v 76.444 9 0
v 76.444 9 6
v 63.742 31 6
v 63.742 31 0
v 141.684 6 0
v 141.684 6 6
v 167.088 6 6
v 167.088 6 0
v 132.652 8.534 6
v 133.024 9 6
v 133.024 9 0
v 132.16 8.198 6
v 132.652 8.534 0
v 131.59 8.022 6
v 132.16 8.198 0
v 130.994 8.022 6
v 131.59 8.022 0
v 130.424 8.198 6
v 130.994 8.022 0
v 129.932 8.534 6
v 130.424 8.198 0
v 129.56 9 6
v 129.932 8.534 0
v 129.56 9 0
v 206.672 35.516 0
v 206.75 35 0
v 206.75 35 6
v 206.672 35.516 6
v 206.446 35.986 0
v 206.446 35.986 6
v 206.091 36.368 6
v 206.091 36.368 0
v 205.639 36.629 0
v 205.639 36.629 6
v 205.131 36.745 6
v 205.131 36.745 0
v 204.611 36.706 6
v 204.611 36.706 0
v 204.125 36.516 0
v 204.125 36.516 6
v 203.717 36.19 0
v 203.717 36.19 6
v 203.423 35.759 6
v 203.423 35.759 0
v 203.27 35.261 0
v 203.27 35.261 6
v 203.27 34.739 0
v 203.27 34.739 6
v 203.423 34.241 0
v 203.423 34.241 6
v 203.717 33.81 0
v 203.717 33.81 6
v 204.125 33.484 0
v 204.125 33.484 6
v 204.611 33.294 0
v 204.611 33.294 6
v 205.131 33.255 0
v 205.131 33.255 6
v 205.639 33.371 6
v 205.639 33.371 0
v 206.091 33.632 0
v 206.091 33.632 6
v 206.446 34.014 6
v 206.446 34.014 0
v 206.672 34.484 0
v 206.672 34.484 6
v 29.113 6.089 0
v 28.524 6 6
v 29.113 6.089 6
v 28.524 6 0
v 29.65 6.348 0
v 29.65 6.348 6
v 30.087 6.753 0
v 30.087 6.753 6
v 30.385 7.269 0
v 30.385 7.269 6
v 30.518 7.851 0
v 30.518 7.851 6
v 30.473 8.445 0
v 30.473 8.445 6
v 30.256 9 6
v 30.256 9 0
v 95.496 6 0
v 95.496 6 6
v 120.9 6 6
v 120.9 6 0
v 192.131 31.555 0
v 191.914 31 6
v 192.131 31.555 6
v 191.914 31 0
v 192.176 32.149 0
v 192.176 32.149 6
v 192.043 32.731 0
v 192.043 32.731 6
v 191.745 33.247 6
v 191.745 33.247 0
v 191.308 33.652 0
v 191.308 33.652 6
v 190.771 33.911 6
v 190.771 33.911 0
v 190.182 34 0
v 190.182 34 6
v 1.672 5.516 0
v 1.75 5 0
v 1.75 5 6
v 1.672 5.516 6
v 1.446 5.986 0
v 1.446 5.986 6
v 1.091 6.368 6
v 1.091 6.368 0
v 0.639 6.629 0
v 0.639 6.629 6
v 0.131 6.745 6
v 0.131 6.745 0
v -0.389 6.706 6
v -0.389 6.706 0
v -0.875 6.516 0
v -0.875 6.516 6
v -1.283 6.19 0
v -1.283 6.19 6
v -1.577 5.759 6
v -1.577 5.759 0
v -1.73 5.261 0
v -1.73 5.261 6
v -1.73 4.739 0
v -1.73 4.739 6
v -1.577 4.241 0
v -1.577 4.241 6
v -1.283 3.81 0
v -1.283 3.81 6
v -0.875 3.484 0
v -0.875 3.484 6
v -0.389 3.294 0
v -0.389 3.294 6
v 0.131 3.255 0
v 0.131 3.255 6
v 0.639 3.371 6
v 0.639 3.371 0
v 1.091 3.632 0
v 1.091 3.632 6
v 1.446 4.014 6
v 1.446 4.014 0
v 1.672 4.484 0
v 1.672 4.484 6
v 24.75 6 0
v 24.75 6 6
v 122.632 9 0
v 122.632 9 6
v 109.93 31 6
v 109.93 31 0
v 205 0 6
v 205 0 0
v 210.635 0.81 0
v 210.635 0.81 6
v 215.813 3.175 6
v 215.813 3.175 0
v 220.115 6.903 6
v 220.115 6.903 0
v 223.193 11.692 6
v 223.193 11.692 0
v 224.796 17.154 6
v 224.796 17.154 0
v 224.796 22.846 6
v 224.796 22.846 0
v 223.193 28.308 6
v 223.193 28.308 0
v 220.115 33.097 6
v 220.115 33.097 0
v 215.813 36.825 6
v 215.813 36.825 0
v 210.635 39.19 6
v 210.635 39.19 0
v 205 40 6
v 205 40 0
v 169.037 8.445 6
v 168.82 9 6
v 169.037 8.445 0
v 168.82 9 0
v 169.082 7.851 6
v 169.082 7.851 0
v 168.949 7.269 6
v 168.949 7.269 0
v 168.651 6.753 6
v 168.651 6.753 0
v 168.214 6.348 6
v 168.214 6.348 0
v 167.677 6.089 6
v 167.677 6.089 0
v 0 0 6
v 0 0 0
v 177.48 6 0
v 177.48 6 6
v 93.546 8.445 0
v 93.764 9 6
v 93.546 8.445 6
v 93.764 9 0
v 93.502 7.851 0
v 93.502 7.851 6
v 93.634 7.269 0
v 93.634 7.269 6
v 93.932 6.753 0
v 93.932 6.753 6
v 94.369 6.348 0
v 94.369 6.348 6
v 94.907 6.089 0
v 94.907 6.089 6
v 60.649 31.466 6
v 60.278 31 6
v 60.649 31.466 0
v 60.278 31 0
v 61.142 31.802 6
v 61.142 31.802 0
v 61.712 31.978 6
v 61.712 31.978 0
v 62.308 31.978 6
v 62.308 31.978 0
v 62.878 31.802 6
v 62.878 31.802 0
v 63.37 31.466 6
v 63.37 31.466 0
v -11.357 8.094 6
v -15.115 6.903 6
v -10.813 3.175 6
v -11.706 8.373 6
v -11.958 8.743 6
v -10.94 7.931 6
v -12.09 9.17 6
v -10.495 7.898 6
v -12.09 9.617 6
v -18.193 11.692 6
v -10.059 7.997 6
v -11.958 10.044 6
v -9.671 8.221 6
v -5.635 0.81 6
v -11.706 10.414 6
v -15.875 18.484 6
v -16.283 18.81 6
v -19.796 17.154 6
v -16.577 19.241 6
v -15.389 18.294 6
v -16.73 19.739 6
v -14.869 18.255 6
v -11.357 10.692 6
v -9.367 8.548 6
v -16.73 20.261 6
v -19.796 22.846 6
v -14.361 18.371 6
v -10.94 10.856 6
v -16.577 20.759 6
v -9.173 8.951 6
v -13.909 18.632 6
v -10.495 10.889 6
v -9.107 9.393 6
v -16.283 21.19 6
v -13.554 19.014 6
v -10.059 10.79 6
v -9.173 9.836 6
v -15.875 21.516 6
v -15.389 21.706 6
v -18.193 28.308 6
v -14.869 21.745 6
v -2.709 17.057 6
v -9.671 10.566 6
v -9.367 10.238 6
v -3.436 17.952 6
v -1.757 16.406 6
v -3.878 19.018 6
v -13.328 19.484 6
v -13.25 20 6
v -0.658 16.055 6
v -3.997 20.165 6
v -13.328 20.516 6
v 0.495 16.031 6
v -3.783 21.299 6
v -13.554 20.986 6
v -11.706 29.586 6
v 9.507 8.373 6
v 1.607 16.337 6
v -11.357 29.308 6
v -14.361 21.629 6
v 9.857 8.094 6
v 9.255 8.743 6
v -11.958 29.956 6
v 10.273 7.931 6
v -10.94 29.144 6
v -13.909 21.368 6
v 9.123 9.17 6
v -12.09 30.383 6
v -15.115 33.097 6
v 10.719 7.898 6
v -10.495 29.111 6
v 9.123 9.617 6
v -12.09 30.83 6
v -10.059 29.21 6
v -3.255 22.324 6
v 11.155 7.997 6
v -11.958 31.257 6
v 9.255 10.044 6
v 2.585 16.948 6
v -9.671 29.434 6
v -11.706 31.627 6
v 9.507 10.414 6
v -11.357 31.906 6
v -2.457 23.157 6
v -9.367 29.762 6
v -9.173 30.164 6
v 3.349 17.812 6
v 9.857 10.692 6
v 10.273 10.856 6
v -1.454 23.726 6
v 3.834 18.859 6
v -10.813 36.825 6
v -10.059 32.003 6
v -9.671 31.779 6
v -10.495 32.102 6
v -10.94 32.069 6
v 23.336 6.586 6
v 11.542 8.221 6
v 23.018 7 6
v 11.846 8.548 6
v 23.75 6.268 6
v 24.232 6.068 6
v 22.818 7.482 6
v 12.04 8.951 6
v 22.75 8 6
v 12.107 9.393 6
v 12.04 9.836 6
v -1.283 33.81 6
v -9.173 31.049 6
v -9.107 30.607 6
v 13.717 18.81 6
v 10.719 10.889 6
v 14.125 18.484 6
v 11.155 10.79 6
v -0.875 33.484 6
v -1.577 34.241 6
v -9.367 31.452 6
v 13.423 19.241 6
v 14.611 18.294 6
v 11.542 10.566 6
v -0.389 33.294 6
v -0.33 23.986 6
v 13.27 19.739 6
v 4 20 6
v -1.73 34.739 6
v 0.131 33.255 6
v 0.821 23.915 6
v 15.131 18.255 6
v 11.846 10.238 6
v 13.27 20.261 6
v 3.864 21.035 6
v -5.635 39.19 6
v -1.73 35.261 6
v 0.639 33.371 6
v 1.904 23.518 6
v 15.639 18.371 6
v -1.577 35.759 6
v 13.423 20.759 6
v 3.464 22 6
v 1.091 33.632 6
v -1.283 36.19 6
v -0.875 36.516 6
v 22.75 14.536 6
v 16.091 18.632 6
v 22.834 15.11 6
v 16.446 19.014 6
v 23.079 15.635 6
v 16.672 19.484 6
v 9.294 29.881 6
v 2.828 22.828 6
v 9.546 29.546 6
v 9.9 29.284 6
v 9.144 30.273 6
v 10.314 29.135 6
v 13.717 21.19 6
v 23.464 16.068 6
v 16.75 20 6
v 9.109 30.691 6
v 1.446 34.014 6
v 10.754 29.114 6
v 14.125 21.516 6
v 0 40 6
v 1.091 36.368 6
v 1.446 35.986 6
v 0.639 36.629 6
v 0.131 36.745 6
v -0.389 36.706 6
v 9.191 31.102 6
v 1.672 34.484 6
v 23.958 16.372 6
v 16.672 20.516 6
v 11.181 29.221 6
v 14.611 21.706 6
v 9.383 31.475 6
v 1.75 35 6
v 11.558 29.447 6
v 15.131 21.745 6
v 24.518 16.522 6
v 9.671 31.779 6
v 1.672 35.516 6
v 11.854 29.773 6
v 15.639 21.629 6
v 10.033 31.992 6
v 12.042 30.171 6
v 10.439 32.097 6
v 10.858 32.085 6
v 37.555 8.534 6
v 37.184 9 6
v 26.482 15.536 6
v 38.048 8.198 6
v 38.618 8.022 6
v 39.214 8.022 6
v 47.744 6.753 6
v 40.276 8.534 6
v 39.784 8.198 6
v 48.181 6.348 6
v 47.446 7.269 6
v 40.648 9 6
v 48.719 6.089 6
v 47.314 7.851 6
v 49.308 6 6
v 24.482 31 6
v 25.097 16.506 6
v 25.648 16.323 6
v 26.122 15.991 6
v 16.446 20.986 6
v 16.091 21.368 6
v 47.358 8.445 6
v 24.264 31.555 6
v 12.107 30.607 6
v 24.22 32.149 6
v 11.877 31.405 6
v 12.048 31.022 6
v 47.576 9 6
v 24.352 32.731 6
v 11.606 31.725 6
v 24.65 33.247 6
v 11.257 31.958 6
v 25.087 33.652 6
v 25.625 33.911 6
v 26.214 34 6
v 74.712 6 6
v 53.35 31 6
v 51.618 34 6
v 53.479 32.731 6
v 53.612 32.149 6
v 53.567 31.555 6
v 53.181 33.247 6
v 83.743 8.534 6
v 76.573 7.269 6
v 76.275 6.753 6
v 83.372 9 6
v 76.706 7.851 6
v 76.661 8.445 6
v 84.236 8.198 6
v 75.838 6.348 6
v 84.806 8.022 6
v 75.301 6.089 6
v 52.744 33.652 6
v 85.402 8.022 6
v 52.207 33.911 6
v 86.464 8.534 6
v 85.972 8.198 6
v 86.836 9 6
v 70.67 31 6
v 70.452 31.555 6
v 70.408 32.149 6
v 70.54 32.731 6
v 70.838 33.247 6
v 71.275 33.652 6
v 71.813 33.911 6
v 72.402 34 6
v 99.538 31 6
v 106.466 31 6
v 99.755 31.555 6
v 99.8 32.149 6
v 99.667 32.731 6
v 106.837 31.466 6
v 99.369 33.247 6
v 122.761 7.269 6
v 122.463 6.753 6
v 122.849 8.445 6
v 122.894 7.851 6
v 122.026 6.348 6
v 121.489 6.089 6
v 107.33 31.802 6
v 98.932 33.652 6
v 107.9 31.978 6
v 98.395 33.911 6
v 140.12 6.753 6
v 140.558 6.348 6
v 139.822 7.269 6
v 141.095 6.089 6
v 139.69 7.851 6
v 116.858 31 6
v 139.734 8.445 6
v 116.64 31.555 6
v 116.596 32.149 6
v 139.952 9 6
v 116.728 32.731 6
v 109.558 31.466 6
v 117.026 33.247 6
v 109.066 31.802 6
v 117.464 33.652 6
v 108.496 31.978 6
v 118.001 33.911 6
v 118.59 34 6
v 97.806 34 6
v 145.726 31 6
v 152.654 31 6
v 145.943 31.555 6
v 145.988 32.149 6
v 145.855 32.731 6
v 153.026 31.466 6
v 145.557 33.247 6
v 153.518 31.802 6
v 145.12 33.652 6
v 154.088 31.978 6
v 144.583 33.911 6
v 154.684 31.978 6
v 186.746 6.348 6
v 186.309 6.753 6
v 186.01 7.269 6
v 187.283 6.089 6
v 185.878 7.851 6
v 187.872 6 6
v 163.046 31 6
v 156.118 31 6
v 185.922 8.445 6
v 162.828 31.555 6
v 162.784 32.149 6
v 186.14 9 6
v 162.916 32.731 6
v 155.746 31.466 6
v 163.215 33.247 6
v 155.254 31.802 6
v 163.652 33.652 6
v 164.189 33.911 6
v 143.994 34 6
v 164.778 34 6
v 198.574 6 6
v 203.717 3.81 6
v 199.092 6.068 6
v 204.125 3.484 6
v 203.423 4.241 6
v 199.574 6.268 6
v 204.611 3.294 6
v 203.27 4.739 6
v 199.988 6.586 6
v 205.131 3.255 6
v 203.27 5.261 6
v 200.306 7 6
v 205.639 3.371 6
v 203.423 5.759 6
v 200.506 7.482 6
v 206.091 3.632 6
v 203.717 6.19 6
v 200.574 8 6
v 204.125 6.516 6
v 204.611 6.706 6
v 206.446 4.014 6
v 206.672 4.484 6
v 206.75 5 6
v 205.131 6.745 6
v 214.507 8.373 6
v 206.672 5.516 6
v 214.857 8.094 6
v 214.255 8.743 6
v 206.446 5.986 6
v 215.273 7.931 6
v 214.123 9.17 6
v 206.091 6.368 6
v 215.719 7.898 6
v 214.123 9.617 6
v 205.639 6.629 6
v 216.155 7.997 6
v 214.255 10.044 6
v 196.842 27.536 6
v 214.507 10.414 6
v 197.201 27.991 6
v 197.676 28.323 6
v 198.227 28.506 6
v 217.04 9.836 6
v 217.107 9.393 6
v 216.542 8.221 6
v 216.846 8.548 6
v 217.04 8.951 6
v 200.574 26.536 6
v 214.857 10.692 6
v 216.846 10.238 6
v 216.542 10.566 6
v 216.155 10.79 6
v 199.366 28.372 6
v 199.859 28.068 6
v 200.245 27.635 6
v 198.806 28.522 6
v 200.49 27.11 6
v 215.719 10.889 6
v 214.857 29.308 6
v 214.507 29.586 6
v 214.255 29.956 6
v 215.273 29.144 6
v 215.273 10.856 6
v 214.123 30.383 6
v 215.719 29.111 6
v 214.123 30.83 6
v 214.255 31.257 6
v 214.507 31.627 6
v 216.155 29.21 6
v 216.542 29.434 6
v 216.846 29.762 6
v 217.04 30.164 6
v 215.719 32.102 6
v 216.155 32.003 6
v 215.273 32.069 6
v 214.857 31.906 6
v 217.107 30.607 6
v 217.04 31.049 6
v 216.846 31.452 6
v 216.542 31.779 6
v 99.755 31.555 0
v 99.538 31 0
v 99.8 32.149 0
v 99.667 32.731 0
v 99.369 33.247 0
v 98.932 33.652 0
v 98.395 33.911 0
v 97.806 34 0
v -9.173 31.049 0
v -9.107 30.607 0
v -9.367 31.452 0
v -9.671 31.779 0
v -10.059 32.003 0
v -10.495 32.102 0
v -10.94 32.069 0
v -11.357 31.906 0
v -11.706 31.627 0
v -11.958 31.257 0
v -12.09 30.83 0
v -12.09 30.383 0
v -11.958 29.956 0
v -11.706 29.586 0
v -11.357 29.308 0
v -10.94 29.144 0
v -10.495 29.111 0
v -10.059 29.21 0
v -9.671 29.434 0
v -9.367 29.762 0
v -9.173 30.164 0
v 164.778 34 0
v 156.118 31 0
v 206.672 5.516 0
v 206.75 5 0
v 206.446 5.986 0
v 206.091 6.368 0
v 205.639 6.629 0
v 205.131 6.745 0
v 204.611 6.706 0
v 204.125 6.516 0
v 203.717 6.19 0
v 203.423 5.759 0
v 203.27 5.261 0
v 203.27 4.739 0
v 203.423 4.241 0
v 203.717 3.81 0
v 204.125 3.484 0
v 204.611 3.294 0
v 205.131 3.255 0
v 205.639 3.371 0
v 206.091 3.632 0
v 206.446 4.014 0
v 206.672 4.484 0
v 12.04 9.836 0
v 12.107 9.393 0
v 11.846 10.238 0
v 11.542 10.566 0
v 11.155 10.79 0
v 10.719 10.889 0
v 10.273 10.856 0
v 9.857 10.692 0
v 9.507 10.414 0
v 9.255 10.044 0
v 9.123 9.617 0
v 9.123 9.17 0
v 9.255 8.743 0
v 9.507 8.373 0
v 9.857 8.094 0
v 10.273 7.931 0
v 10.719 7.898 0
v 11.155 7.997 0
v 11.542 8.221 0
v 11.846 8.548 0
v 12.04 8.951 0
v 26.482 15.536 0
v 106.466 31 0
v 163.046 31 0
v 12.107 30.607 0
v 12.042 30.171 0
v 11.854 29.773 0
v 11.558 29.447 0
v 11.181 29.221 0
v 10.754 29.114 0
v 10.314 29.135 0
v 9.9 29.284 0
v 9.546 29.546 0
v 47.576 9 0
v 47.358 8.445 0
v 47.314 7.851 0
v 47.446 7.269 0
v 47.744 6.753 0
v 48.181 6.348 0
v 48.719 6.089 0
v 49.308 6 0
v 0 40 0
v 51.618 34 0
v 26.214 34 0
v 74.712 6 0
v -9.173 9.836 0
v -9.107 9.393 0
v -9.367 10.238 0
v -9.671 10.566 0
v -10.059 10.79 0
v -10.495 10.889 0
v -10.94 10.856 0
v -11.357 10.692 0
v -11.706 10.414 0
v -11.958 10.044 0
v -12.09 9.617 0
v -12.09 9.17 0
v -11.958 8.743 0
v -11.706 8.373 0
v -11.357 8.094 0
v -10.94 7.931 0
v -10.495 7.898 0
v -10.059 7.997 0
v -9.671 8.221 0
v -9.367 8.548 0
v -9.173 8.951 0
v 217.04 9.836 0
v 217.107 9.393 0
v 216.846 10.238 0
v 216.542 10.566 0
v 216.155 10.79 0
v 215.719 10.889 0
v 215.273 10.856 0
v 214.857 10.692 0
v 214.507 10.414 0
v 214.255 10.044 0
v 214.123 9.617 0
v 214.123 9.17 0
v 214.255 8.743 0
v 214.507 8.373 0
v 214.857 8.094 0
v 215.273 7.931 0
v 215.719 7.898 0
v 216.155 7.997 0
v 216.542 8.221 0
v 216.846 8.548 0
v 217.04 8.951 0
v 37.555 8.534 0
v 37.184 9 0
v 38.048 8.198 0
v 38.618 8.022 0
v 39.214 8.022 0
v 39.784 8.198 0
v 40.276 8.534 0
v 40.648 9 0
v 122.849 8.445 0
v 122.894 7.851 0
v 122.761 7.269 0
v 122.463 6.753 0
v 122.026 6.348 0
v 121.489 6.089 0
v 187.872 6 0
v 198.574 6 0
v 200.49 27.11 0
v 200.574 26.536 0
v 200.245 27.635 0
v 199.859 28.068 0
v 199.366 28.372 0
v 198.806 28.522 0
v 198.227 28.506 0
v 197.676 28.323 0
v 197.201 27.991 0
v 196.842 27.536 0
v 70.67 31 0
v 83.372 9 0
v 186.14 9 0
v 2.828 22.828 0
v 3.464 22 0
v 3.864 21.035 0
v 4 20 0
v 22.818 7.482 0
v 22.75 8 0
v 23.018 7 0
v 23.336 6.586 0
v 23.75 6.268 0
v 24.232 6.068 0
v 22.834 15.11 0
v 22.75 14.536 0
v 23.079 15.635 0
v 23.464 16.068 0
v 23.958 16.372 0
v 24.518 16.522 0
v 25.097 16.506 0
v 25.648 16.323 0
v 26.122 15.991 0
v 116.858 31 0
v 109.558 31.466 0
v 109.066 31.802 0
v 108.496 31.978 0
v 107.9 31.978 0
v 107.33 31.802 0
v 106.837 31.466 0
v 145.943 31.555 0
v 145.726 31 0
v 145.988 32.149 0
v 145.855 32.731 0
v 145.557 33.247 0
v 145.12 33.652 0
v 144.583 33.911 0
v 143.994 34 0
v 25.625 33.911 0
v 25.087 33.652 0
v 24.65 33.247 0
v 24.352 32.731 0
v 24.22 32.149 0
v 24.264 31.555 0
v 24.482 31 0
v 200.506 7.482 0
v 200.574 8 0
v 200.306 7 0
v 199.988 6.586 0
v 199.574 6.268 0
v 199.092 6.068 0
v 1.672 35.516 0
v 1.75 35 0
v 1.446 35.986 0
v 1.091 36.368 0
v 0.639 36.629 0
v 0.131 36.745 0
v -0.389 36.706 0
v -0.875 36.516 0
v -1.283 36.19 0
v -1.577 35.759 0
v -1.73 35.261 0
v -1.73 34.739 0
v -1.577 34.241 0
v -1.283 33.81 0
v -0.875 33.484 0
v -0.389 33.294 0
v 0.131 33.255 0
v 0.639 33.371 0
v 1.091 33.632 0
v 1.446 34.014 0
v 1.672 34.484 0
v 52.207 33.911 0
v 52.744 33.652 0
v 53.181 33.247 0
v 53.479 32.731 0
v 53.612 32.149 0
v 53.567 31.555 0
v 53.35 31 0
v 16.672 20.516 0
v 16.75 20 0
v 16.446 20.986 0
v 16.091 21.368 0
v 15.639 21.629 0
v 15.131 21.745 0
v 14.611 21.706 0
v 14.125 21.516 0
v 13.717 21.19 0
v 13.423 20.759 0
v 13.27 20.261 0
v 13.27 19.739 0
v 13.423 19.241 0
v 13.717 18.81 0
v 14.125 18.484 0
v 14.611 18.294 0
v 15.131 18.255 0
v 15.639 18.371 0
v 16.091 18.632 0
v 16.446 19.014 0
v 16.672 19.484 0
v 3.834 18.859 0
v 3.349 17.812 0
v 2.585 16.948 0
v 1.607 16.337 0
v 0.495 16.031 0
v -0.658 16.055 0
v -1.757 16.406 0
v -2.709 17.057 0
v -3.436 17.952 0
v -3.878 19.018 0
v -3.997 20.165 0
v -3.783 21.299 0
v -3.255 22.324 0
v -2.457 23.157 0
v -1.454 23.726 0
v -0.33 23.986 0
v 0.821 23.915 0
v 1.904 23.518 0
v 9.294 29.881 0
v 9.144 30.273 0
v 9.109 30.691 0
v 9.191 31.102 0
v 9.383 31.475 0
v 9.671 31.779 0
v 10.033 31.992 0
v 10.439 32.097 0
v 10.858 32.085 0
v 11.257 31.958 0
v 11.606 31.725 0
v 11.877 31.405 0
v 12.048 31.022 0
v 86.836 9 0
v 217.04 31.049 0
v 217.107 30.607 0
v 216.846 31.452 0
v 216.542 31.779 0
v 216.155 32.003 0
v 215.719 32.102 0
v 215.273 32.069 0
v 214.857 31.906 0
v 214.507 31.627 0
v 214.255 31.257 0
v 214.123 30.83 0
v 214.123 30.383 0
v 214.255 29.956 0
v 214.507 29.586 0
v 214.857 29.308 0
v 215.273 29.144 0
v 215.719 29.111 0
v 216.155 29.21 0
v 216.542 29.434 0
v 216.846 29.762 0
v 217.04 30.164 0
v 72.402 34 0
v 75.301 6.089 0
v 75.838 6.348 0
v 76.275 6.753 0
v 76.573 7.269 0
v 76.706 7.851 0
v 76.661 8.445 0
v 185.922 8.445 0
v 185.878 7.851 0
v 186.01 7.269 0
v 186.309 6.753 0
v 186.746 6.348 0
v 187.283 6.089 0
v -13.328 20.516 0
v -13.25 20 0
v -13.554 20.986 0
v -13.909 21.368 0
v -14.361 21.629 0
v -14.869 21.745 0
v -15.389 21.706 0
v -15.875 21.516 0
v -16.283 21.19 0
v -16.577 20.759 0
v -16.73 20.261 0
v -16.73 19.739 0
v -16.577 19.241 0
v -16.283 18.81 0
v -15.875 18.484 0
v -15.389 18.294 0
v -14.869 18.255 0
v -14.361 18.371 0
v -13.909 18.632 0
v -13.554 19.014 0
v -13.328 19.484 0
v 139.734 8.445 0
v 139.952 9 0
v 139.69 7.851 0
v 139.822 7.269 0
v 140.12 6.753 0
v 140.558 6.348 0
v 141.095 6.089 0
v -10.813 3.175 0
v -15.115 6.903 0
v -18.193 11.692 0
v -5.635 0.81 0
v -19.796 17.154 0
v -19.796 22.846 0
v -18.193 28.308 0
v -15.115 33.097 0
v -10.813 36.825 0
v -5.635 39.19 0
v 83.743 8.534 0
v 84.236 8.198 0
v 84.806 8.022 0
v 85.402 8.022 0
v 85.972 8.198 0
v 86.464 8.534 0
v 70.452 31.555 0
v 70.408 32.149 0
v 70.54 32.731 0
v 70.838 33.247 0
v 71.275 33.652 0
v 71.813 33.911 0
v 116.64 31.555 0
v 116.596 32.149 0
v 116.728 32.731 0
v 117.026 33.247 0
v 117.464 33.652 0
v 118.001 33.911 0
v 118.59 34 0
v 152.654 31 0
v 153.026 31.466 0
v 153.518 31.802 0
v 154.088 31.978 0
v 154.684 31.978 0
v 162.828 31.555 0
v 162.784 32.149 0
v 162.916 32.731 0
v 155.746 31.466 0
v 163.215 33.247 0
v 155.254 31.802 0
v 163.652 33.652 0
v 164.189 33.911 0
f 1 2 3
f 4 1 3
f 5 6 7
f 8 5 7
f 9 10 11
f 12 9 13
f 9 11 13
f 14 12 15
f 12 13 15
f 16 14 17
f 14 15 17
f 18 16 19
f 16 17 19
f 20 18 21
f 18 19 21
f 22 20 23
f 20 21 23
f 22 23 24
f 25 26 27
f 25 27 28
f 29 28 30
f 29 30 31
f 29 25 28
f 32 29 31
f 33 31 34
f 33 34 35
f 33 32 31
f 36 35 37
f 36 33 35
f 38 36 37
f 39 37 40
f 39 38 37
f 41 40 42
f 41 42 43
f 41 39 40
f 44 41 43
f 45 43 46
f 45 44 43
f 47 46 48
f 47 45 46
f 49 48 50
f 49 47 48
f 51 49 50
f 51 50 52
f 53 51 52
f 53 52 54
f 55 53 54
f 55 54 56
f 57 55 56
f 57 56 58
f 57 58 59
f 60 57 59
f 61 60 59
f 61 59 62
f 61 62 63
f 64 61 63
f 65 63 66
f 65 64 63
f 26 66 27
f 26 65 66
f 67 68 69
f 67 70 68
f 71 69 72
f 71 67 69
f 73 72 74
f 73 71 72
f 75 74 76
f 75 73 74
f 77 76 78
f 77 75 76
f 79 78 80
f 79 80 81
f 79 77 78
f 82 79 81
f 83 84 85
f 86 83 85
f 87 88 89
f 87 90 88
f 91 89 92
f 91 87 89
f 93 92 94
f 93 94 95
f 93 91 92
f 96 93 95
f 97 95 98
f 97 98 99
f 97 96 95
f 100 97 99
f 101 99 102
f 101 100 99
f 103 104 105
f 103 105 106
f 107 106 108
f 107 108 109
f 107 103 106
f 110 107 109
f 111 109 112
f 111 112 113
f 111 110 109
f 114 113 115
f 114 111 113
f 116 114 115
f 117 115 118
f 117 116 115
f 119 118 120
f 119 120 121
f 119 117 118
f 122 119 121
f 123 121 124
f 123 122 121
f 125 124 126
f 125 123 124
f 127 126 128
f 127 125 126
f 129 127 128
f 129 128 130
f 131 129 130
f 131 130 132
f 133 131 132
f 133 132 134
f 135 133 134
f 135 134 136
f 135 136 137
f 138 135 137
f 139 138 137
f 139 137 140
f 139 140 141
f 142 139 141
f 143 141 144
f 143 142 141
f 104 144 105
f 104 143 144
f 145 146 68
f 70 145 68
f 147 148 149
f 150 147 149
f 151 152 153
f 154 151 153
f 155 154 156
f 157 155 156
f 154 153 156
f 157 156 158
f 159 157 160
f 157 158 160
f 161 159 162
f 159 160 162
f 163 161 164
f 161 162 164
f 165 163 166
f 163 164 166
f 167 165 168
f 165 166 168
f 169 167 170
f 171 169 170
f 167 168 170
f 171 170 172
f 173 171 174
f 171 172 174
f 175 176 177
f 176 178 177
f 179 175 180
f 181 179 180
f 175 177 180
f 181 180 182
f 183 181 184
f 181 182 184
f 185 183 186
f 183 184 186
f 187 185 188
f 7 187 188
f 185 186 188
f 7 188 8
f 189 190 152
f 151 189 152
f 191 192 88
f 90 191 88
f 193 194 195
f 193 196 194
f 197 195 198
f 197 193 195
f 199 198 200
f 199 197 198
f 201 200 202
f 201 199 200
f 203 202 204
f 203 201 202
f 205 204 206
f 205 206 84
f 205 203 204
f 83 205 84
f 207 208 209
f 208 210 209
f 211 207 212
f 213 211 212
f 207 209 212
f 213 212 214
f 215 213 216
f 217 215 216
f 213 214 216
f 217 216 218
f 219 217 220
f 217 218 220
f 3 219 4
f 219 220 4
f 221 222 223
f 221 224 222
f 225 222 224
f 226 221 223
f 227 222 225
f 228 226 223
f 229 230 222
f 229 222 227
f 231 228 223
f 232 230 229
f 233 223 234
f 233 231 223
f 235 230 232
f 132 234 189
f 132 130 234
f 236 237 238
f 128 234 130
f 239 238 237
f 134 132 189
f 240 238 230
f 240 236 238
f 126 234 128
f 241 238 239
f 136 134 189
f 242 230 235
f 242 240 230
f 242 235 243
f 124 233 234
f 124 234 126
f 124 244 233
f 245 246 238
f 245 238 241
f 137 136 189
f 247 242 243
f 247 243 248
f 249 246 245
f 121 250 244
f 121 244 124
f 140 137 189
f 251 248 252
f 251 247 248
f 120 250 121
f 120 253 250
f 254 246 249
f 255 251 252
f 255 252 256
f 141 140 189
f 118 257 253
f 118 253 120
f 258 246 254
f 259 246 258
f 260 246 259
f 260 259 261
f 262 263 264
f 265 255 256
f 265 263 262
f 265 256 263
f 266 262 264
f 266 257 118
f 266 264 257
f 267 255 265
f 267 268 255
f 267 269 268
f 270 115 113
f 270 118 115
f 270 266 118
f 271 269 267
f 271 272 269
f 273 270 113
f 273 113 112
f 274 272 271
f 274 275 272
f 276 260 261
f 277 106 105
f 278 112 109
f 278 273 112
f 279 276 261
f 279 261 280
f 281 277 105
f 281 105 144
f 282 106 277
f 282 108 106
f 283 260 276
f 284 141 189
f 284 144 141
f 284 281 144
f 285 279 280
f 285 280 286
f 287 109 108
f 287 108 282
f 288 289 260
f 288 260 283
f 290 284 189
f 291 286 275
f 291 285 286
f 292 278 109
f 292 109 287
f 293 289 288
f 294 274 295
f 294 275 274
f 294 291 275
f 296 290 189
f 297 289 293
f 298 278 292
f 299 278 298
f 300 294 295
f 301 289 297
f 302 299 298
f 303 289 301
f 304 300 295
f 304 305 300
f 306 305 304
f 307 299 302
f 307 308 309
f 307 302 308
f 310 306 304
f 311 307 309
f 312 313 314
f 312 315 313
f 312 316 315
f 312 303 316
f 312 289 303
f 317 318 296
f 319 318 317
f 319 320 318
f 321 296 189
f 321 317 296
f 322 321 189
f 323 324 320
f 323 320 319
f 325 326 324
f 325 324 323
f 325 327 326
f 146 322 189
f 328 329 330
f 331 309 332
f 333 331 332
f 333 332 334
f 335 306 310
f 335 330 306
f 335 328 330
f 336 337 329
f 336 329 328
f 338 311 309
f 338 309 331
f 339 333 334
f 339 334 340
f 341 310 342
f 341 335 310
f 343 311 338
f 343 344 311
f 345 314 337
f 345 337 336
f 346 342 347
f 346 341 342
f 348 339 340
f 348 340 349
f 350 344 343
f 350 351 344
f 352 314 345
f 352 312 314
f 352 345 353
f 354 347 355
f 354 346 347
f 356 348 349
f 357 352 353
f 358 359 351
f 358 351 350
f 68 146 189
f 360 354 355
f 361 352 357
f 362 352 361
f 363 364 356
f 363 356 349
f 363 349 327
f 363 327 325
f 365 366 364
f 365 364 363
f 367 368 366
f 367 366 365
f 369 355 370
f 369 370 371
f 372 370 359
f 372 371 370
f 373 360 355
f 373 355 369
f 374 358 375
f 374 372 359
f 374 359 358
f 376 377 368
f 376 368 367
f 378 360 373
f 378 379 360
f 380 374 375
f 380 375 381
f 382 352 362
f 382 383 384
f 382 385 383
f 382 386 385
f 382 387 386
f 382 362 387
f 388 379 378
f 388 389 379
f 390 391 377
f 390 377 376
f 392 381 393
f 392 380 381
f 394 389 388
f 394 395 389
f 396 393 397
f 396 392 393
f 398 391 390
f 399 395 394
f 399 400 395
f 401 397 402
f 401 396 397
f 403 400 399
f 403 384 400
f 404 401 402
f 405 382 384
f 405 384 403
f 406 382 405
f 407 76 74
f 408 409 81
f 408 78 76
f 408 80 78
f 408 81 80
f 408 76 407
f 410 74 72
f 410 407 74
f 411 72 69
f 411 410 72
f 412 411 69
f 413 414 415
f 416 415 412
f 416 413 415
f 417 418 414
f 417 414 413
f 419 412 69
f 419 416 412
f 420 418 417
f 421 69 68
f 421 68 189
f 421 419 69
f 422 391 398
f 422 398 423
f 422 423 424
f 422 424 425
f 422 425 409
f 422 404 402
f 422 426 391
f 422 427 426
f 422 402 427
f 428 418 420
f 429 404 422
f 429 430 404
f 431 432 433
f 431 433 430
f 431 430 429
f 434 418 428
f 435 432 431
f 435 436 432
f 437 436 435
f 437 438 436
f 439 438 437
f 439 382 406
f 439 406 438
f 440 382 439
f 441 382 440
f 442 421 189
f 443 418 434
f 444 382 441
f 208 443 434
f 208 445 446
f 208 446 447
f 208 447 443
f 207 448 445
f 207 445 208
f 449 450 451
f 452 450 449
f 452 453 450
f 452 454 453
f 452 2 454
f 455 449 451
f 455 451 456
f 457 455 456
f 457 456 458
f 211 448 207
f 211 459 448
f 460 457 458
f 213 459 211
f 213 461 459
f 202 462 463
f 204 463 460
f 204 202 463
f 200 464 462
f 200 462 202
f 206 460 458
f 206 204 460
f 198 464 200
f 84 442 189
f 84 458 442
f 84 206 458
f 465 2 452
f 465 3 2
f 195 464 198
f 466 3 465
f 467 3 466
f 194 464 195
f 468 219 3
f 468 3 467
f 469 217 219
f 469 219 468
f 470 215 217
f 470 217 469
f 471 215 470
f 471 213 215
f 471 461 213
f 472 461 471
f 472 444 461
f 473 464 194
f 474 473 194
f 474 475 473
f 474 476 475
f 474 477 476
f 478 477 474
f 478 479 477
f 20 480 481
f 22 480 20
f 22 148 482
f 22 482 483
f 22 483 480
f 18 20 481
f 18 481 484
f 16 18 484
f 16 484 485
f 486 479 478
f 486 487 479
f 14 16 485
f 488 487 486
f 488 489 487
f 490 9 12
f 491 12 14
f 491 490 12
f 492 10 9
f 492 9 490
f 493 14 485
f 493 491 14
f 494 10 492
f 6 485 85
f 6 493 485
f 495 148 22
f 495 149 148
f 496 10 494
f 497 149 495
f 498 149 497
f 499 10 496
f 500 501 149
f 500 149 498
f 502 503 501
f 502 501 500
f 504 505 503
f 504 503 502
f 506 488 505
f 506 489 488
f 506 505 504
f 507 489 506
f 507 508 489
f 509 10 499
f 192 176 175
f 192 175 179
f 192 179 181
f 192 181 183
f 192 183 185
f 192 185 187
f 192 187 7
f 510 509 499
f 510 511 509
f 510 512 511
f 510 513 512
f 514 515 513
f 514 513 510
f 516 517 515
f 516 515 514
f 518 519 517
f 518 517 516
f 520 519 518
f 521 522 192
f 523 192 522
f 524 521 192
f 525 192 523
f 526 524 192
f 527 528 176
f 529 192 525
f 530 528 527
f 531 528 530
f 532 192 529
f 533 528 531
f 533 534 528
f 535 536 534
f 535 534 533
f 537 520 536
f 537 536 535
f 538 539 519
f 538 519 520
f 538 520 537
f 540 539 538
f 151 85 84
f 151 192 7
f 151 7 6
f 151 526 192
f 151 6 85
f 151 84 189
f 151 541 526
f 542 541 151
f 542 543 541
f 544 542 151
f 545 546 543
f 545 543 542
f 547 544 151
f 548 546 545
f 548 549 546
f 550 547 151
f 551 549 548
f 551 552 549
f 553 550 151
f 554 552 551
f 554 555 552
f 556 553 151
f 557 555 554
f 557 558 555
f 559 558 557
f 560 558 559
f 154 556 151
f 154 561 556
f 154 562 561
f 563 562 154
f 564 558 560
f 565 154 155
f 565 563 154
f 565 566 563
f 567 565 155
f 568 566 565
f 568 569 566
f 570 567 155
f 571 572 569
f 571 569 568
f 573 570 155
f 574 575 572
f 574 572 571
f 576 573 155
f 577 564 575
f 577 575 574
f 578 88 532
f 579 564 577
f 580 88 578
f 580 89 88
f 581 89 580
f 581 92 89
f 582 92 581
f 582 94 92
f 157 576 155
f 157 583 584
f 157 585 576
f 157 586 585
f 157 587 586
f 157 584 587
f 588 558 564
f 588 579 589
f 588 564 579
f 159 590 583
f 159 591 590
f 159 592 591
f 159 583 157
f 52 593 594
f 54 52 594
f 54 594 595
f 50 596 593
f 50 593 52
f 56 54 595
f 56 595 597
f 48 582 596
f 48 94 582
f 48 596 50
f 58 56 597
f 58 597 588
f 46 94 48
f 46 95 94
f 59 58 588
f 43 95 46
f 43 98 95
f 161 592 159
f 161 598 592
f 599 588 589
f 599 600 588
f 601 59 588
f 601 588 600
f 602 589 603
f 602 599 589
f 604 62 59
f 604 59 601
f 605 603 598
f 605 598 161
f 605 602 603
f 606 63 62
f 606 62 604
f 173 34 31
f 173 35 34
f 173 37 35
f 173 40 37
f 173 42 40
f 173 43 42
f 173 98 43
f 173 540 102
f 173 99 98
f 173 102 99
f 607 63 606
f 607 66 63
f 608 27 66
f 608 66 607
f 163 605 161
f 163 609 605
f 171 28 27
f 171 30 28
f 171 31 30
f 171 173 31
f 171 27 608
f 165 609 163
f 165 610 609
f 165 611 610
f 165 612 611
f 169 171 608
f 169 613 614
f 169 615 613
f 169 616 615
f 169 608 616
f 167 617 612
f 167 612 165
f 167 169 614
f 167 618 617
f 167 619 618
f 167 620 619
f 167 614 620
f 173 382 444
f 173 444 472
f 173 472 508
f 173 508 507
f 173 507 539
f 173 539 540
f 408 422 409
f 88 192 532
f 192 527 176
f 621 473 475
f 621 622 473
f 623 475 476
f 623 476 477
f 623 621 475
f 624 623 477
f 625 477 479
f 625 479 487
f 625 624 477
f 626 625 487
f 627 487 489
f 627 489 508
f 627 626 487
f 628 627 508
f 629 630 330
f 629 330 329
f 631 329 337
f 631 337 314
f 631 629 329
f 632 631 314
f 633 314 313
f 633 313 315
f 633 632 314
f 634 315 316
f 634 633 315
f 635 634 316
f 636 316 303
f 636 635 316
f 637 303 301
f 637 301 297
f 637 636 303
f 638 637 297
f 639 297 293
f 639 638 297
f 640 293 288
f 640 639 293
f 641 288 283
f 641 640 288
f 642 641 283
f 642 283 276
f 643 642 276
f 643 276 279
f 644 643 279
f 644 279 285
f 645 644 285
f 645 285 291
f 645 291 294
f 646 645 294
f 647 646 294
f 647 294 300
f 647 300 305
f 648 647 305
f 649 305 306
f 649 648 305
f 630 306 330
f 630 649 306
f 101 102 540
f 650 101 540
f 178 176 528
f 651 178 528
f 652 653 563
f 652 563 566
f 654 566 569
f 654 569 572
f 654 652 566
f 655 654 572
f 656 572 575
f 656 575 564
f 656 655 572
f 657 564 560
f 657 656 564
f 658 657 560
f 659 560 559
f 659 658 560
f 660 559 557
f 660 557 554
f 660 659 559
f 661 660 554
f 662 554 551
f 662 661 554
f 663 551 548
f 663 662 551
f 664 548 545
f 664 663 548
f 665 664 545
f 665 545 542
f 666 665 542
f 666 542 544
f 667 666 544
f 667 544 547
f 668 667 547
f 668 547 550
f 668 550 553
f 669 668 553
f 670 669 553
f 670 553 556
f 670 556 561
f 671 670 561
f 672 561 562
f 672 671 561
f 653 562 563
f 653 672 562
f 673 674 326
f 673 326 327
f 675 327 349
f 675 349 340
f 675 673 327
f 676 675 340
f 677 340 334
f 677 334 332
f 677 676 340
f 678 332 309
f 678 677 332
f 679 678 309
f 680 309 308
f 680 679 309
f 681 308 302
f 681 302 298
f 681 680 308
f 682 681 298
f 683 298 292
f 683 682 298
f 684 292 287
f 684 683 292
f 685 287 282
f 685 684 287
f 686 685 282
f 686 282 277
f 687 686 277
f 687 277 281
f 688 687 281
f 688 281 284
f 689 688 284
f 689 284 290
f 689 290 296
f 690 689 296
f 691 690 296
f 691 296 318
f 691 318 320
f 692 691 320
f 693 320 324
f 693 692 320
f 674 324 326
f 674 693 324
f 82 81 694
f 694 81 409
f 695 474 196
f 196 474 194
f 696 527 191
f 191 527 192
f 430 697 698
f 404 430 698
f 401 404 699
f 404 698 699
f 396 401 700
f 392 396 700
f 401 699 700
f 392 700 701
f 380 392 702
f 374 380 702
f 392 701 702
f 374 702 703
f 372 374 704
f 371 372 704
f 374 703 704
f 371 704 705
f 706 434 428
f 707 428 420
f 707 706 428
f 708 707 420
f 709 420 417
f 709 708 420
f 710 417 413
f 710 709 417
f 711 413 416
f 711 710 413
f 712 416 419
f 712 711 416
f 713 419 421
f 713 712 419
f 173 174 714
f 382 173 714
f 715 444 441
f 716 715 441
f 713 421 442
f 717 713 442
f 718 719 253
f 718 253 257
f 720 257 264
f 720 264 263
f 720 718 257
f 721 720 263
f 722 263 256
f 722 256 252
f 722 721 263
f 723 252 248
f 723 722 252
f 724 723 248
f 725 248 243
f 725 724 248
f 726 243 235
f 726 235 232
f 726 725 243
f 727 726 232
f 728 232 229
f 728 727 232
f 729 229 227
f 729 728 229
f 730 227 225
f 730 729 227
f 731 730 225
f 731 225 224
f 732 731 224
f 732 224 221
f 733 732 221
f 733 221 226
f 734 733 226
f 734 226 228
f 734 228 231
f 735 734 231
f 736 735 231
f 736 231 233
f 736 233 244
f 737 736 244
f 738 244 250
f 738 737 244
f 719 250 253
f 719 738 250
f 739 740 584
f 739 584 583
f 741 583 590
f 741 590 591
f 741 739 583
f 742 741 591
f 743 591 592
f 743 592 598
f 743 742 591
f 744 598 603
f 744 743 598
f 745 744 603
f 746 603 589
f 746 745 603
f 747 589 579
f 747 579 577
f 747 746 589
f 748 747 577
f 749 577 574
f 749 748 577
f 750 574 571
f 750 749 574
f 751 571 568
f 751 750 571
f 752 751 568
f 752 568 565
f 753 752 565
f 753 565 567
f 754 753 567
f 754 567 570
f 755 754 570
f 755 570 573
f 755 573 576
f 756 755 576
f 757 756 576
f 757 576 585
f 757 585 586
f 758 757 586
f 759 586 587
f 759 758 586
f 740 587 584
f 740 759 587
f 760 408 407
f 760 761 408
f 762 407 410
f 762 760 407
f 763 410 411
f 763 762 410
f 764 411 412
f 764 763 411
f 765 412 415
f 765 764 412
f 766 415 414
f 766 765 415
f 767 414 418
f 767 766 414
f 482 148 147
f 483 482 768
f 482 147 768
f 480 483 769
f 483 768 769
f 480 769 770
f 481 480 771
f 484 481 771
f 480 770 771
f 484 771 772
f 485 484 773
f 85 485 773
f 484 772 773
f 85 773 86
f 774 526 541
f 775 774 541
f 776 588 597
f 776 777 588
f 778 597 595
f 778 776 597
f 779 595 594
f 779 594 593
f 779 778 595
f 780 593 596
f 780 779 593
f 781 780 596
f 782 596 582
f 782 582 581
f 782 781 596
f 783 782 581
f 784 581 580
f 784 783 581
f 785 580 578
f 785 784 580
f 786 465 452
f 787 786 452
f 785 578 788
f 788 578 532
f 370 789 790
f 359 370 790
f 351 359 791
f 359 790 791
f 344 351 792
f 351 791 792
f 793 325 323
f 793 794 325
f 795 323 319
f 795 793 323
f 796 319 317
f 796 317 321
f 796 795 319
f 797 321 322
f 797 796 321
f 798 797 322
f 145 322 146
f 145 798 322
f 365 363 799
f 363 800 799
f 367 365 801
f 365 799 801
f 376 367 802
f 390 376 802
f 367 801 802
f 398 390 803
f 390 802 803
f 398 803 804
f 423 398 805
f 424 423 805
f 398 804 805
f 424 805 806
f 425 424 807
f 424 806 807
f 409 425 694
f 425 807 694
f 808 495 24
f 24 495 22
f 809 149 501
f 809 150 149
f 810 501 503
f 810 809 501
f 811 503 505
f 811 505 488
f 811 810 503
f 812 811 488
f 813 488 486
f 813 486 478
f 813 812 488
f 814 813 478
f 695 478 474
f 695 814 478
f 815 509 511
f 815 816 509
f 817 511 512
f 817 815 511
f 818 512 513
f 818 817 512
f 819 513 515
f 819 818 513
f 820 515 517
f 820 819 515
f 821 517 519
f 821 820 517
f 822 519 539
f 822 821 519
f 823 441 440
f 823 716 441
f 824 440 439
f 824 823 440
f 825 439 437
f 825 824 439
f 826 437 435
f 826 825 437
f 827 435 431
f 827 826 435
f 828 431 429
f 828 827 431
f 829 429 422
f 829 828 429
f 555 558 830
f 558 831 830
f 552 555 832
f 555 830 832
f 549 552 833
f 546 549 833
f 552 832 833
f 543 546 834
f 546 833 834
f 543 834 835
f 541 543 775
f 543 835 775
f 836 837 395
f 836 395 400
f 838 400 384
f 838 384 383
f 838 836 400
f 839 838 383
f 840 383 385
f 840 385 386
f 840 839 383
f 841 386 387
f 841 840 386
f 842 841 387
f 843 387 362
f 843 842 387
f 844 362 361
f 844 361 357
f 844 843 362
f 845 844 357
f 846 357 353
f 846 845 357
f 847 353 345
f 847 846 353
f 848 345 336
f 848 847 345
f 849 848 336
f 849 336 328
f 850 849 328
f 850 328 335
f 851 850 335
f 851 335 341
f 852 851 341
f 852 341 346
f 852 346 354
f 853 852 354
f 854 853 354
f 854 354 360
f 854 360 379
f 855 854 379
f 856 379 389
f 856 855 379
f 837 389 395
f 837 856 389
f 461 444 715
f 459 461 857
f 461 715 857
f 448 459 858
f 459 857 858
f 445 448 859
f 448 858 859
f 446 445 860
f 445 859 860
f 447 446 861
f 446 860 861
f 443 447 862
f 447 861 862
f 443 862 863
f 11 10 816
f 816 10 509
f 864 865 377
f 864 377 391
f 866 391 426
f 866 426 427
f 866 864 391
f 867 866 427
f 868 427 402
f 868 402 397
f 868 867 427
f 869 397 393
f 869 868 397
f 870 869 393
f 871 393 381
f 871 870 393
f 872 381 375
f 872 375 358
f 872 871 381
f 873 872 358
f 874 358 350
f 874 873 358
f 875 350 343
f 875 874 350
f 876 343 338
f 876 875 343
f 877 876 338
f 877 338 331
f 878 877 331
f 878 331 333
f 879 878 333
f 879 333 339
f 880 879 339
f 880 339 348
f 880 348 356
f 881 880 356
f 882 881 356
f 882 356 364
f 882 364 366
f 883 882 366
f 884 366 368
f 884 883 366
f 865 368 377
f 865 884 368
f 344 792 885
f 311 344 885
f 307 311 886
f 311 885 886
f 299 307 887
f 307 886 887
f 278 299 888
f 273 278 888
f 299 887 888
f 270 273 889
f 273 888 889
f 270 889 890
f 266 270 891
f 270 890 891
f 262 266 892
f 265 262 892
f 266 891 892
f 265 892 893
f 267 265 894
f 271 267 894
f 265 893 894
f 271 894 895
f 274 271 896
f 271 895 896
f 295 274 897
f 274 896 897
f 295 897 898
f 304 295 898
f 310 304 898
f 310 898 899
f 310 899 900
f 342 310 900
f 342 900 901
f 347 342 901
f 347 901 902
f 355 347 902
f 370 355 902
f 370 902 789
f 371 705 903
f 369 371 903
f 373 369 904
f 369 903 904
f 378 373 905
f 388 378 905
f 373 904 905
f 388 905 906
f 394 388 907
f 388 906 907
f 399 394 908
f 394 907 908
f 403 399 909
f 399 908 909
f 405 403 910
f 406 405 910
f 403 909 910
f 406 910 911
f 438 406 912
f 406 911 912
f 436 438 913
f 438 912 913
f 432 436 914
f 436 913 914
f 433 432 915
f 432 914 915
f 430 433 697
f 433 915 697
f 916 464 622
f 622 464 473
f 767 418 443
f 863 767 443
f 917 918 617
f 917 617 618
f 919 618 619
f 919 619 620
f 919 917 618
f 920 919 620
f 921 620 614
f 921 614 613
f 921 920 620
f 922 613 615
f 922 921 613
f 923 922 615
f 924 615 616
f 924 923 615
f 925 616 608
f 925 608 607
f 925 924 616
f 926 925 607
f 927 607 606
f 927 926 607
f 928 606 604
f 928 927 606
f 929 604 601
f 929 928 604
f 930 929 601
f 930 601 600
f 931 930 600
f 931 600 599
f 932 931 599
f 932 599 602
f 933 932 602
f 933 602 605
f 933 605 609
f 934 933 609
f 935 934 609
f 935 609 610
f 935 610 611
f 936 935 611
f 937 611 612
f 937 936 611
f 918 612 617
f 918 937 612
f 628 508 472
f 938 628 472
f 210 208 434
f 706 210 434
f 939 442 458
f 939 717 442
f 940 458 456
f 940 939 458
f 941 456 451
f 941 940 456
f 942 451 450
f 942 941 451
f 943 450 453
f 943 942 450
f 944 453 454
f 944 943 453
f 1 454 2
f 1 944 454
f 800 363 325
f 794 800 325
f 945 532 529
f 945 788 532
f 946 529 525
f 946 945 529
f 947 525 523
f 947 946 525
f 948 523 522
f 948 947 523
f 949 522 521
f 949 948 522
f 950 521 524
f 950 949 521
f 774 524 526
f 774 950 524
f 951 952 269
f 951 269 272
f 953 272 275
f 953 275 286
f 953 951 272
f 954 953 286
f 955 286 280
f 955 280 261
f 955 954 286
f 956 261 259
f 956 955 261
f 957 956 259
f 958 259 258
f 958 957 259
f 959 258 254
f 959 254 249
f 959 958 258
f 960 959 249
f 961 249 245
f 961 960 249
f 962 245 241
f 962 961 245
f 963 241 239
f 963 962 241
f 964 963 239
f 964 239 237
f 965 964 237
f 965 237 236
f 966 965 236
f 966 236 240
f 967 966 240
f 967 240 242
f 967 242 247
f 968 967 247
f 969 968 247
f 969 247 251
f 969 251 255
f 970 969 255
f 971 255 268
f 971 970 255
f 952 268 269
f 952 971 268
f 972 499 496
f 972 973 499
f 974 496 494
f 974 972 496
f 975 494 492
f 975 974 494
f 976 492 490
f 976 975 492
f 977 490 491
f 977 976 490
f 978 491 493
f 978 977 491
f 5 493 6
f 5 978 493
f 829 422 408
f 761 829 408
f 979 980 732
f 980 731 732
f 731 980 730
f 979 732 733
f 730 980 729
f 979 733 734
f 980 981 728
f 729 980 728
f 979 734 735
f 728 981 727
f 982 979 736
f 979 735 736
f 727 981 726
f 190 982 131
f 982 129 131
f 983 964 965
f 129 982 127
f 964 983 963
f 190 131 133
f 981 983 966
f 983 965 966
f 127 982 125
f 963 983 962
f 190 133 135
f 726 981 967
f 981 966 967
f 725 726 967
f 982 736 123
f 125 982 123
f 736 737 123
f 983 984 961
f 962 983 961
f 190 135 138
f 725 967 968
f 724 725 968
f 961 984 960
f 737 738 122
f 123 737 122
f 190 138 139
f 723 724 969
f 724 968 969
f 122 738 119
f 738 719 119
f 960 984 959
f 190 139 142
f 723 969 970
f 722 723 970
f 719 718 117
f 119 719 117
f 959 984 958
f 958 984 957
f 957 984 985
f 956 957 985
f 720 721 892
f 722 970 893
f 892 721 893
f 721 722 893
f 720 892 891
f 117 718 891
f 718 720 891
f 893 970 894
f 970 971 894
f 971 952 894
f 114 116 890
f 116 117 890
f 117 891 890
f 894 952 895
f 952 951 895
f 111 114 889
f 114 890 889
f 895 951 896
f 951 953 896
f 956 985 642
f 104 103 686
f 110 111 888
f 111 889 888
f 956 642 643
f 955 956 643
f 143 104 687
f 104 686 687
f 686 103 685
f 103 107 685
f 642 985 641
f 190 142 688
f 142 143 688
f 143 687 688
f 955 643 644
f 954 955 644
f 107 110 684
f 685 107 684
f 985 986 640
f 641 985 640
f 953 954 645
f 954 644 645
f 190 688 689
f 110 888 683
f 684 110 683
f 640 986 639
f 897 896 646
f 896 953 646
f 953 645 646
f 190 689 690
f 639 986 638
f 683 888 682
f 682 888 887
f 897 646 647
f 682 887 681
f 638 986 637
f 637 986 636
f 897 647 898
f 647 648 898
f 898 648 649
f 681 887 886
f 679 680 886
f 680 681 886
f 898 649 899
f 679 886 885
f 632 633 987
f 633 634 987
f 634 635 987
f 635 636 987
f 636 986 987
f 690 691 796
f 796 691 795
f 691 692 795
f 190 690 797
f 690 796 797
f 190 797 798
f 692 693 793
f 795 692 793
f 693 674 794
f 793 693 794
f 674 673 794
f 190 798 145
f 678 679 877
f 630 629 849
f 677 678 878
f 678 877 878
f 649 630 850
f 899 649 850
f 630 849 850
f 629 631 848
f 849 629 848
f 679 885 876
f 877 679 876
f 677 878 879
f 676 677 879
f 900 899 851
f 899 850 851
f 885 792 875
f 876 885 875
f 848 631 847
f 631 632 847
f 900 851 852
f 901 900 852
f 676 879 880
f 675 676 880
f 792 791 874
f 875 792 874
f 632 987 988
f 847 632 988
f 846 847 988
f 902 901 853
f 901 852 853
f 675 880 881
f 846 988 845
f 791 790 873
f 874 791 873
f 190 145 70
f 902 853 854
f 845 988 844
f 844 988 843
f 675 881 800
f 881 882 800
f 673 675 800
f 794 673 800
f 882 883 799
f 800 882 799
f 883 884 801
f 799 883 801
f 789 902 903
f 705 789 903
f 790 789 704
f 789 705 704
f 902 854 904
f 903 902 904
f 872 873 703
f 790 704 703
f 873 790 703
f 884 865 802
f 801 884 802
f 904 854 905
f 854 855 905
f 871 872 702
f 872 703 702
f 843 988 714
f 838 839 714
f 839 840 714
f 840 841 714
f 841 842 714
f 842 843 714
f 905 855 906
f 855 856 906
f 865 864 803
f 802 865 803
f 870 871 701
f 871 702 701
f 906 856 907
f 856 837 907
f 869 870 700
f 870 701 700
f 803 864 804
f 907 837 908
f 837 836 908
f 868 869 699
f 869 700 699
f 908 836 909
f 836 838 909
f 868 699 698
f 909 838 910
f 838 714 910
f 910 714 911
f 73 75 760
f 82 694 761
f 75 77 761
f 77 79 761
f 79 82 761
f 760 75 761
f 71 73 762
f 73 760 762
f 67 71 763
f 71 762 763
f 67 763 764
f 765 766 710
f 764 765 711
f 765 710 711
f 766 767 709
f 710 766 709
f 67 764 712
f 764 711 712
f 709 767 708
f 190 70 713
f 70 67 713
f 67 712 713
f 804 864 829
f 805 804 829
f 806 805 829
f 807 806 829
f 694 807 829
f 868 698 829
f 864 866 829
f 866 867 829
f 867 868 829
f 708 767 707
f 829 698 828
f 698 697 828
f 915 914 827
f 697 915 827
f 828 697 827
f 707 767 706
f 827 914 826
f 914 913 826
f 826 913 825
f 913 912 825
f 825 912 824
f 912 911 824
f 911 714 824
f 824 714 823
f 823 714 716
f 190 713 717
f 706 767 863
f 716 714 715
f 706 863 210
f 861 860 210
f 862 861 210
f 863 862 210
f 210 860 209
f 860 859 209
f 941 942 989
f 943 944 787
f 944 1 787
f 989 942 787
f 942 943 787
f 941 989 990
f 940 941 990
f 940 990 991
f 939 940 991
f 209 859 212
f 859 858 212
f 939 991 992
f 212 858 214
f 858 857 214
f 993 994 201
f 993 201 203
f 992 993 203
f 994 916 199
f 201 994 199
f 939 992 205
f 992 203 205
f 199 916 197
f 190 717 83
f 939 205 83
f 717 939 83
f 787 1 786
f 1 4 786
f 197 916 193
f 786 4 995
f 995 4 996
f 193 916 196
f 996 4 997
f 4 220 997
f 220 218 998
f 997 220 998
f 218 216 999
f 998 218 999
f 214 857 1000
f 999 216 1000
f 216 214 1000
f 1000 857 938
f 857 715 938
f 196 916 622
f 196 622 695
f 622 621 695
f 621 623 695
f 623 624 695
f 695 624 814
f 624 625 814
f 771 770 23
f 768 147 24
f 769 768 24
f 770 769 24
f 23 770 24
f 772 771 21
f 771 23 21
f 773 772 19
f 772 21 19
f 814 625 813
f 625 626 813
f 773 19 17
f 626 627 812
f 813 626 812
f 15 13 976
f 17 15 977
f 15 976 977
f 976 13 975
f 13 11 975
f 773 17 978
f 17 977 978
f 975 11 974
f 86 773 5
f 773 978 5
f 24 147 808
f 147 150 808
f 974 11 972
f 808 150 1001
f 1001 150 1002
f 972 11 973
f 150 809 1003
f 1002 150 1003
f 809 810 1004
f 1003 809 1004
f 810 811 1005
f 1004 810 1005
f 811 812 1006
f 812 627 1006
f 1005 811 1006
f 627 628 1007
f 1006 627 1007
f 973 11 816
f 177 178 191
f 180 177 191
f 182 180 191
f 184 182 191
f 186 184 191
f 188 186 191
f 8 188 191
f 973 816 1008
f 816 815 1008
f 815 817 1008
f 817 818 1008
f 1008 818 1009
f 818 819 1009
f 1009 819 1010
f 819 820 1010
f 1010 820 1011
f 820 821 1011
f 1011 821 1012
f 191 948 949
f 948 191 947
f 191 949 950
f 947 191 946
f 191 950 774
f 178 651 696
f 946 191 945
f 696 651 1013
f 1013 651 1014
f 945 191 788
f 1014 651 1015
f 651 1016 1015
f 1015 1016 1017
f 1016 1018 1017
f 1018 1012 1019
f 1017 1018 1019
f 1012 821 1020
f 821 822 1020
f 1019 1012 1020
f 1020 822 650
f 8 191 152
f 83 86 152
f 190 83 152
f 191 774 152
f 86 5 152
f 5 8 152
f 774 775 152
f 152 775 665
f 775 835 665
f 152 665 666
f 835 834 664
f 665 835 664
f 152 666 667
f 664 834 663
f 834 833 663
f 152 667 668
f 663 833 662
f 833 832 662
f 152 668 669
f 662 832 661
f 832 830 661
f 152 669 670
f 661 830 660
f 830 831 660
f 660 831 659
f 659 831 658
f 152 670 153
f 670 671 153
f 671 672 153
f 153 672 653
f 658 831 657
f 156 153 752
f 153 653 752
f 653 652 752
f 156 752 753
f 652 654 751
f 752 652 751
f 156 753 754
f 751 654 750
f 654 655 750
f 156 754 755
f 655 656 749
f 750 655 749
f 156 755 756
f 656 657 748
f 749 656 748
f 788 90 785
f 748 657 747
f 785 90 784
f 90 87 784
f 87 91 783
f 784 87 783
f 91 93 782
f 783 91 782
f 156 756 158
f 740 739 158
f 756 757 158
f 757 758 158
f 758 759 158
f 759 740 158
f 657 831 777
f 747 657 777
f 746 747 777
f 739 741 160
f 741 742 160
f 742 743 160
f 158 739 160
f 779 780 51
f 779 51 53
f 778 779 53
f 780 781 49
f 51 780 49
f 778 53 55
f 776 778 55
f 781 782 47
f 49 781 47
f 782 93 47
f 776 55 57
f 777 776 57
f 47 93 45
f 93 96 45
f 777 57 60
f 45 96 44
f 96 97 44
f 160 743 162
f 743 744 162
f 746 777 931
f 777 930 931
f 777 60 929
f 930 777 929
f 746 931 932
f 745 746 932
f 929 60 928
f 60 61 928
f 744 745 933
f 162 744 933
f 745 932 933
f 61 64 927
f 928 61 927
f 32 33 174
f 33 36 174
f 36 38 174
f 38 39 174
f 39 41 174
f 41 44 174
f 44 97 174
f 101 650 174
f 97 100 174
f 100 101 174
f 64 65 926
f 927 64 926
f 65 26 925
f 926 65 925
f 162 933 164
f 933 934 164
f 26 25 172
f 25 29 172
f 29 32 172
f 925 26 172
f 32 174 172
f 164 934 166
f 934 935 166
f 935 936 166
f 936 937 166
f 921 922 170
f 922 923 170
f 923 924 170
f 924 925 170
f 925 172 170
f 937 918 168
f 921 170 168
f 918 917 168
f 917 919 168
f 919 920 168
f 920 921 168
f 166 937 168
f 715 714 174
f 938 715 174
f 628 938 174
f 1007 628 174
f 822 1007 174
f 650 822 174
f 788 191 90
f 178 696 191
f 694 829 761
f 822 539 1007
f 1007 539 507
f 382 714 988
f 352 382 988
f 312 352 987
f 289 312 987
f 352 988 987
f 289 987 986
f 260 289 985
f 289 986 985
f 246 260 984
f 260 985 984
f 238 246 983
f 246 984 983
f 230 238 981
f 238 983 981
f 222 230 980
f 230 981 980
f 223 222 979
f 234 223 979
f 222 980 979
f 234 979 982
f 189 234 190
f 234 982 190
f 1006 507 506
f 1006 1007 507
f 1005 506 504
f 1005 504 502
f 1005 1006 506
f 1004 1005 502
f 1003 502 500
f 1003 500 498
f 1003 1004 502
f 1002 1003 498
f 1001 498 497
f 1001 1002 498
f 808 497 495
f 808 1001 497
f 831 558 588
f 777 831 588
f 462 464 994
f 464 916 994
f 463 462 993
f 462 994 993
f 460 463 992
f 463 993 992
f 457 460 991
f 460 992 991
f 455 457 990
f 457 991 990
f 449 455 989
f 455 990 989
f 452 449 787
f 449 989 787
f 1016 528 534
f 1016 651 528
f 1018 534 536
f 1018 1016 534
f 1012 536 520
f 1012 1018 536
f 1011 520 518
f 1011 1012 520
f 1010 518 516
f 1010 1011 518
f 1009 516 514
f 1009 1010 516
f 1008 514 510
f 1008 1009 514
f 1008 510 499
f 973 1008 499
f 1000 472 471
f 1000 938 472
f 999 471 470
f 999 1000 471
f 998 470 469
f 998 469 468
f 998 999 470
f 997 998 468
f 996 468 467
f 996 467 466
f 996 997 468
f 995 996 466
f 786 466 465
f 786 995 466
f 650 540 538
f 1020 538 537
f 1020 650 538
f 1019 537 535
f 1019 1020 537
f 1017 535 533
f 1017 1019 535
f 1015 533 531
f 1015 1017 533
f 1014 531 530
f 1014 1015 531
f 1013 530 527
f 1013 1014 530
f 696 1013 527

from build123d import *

# Parameters (mm, degrees)
F0_R     = 1.75
F0_R_2   = 1.5
F1_DEPTH = 6
F3_DEPTH = 6.001
F4_R     = 2


with BuildPart() as f1:
    # F0 (on Top) → F1 (new body)
    with BuildSketch(Plane.XY):
        with BuildLine():
            ThreePointArc((0, 40), (-20, 20), (0, 0))
            Line((0, 0), (205, 0))
            ThreePointArc((205, 0), (225, 20), (205, 40))
            Line((205, 40), (0, 40))
        make_face()
        with Locations((0, 5)):
            Circle(F0_R, mode=Mode.SUBTRACT)
        with Locations((-10.6066017178, 9.3933982822)):
            Circle(F0_R_2, mode=Mode.SUBTRACT)
        with Locations((10.6066017178, 9.3933982822)):
            Circle(F0_R_2, mode=Mode.SUBTRACT)
        with Locations((205, 5)):
            Circle(F0_R, mode=Mode.SUBTRACT)
        with Locations((215.6066017178, 9.3933982822)):
            Circle(F0_R_2, mode=Mode.SUBTRACT)
        with Locations((-15, 20)):
            Circle(F0_R, mode=Mode.SUBTRACT)
        with BuildLine():
            ThreePointArc((4, 20), (-3.69551813, 18.4692662705), (2.8284271247, 22.8284271247))
            ThreePointArc((2.8284271247, 22.8284271247), (3.69551813, 21.5307337295), (4, 20))
        make_face(mode=Mode.SUBTRACT)
        with Locations((15, 20)):
            Circle(F0_R, mode=Mode.SUBTRACT)
        with Locations((-10.6066017178, 30.6066017178)):
            Circle(F0_R_2, mode=Mode.SUBTRACT)
        with BuildLine():
            ThreePointArc((12.1066017178, 30.6066017178), (11.1806268663, 29.220782419), (9.545941546, 29.545941546))
            ThreePointArc((9.545941546, 29.545941546), (10.0325765693, 31.9924210166), (12.1066017178, 30.6066017178))
        make_face(mode=Mode.SUBTRACT)
        with Locations((0, 35)):
            Circle(F0_R, mode=Mode.SUBTRACT)
        with Locations((215.6066017178, 30.6066017178)):
            Circle(F0_R_2, mode=Mode.SUBTRACT)
        with Locations((205, 35)):
            Circle(F0_R, mode=Mode.SUBTRACT)
    extrude(amount=F1_DEPTH)

    # F2 (on face) → F3 (cut, through all)
    with BuildSketch(Plane.XY.offset(6)):
        Polygon((55.0816150746, 34), (22.75, 34), (38.9158075373, 6), align=None)
        Polygon((62.0098183049, 34), (45.8440107676, 6), (78.1756258422, 6), align=None)
        Polygon((85.1038290725, 6), (101.2696366098, 34), (68.9380215352, 34), align=None)
        Polygon((124.3636473774, 6), (108.1978398401, 34), (92.0320323028, 6), align=None)
        Polygon((131.2918506076, 6), (147.457658145, 34), (115.1260430703, 34), align=None)
        Polygon((170.5516689125, 6), (154.3858613752, 34), (138.2200538379, 6), align=None)
        Polygon((177.4798721428, 6), (193.6456796801, 34), (161.3140646055, 34), align=None)
        Polygon((200.5738829104, 6), (200.5738829104, 34), (184.4080753731, 6), align=None)
        Polygon((22.75, 22), (22.75, 6), (31.987604307, 6), align=None)
    extrude(amount=-F3_DEPTH, mode=Mode.SUBTRACT)

    # F4
    f4_edges = [f1.edges().sort_by_distance(p)[0] for p in [
        (22.75, 34, 3),
        (55.081615, 34, 3),
        (38.915808, 6, 3),
        (45.844011, 6, 3),
        (62.009818, 34, 3),
        (78.175626, 6, 3),
        (22.75, 22, 3),
        (22.75, 6, 3),
        (31.987604, 6, 3),
        (68.938022, 34, 3),
        (101.269637, 34, 3),
        (85.103829, 6, 3),
        (92.032032, 6, 3),
        (108.19784, 34, 3),
        (124.363647, 6, 3),
        (115.126043, 34, 3),
        (161.314065, 34, 3),
        (147.457658, 34, 3),
        (193.64568, 34, 3),
        (131.291851, 6, 3),
        (154.385861, 34, 3),
        (170.551669, 6, 3),
        (138.220054, 6, 3),
        (200.573883, 6, 3),
        (184.408075, 6, 3),
        (200.573883, 34, 3),
    ]]
    fillet(f4_edges, radius=F4_R)


solid = f1.part
